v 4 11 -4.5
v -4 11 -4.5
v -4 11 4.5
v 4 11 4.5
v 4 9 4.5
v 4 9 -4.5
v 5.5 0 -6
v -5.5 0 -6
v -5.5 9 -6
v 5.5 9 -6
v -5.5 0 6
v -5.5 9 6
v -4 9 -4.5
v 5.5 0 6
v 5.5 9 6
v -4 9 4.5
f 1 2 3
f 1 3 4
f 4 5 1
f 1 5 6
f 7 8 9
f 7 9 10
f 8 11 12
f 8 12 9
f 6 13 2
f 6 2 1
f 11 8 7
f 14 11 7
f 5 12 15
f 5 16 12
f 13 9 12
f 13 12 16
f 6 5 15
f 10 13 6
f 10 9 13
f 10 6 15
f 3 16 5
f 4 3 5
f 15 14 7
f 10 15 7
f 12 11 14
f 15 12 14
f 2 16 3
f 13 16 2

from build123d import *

# Parameters (mm, degrees)
SKETCH_1_W      = 11
SKETCH_1_H      = 12
EXTRUDE_1_DEPTH = 9
SKETCH_2_W      = 8
SKETCH_2_H      = 9
EXTRUDE_2_DEPTH = 2


with BuildPart() as part:
    # Эскиз1 → Бобышка-Вытянуть1 (new body)
    with BuildSketch(Plane(origin=(0, 0, 0), x_dir=(1, 0, 0), z_dir=(0, 1, 0))):
        Rectangle(SKETCH_1_W, SKETCH_1_H)
    extrude(amount=EXTRUDE_1_DEPTH)

    # Эскиз2 → Бобышка-Вытянуть2 (add)
    with BuildSketch(Plane(origin=(0, 9, 0), x_dir=(1, 0, 0), z_dir=(0, 1, 0))):
        Rectangle(SKETCH_2_W, SKETCH_2_H)
    extrude(amount=EXTRUDE_2_DEPTH)


solid = part.part
